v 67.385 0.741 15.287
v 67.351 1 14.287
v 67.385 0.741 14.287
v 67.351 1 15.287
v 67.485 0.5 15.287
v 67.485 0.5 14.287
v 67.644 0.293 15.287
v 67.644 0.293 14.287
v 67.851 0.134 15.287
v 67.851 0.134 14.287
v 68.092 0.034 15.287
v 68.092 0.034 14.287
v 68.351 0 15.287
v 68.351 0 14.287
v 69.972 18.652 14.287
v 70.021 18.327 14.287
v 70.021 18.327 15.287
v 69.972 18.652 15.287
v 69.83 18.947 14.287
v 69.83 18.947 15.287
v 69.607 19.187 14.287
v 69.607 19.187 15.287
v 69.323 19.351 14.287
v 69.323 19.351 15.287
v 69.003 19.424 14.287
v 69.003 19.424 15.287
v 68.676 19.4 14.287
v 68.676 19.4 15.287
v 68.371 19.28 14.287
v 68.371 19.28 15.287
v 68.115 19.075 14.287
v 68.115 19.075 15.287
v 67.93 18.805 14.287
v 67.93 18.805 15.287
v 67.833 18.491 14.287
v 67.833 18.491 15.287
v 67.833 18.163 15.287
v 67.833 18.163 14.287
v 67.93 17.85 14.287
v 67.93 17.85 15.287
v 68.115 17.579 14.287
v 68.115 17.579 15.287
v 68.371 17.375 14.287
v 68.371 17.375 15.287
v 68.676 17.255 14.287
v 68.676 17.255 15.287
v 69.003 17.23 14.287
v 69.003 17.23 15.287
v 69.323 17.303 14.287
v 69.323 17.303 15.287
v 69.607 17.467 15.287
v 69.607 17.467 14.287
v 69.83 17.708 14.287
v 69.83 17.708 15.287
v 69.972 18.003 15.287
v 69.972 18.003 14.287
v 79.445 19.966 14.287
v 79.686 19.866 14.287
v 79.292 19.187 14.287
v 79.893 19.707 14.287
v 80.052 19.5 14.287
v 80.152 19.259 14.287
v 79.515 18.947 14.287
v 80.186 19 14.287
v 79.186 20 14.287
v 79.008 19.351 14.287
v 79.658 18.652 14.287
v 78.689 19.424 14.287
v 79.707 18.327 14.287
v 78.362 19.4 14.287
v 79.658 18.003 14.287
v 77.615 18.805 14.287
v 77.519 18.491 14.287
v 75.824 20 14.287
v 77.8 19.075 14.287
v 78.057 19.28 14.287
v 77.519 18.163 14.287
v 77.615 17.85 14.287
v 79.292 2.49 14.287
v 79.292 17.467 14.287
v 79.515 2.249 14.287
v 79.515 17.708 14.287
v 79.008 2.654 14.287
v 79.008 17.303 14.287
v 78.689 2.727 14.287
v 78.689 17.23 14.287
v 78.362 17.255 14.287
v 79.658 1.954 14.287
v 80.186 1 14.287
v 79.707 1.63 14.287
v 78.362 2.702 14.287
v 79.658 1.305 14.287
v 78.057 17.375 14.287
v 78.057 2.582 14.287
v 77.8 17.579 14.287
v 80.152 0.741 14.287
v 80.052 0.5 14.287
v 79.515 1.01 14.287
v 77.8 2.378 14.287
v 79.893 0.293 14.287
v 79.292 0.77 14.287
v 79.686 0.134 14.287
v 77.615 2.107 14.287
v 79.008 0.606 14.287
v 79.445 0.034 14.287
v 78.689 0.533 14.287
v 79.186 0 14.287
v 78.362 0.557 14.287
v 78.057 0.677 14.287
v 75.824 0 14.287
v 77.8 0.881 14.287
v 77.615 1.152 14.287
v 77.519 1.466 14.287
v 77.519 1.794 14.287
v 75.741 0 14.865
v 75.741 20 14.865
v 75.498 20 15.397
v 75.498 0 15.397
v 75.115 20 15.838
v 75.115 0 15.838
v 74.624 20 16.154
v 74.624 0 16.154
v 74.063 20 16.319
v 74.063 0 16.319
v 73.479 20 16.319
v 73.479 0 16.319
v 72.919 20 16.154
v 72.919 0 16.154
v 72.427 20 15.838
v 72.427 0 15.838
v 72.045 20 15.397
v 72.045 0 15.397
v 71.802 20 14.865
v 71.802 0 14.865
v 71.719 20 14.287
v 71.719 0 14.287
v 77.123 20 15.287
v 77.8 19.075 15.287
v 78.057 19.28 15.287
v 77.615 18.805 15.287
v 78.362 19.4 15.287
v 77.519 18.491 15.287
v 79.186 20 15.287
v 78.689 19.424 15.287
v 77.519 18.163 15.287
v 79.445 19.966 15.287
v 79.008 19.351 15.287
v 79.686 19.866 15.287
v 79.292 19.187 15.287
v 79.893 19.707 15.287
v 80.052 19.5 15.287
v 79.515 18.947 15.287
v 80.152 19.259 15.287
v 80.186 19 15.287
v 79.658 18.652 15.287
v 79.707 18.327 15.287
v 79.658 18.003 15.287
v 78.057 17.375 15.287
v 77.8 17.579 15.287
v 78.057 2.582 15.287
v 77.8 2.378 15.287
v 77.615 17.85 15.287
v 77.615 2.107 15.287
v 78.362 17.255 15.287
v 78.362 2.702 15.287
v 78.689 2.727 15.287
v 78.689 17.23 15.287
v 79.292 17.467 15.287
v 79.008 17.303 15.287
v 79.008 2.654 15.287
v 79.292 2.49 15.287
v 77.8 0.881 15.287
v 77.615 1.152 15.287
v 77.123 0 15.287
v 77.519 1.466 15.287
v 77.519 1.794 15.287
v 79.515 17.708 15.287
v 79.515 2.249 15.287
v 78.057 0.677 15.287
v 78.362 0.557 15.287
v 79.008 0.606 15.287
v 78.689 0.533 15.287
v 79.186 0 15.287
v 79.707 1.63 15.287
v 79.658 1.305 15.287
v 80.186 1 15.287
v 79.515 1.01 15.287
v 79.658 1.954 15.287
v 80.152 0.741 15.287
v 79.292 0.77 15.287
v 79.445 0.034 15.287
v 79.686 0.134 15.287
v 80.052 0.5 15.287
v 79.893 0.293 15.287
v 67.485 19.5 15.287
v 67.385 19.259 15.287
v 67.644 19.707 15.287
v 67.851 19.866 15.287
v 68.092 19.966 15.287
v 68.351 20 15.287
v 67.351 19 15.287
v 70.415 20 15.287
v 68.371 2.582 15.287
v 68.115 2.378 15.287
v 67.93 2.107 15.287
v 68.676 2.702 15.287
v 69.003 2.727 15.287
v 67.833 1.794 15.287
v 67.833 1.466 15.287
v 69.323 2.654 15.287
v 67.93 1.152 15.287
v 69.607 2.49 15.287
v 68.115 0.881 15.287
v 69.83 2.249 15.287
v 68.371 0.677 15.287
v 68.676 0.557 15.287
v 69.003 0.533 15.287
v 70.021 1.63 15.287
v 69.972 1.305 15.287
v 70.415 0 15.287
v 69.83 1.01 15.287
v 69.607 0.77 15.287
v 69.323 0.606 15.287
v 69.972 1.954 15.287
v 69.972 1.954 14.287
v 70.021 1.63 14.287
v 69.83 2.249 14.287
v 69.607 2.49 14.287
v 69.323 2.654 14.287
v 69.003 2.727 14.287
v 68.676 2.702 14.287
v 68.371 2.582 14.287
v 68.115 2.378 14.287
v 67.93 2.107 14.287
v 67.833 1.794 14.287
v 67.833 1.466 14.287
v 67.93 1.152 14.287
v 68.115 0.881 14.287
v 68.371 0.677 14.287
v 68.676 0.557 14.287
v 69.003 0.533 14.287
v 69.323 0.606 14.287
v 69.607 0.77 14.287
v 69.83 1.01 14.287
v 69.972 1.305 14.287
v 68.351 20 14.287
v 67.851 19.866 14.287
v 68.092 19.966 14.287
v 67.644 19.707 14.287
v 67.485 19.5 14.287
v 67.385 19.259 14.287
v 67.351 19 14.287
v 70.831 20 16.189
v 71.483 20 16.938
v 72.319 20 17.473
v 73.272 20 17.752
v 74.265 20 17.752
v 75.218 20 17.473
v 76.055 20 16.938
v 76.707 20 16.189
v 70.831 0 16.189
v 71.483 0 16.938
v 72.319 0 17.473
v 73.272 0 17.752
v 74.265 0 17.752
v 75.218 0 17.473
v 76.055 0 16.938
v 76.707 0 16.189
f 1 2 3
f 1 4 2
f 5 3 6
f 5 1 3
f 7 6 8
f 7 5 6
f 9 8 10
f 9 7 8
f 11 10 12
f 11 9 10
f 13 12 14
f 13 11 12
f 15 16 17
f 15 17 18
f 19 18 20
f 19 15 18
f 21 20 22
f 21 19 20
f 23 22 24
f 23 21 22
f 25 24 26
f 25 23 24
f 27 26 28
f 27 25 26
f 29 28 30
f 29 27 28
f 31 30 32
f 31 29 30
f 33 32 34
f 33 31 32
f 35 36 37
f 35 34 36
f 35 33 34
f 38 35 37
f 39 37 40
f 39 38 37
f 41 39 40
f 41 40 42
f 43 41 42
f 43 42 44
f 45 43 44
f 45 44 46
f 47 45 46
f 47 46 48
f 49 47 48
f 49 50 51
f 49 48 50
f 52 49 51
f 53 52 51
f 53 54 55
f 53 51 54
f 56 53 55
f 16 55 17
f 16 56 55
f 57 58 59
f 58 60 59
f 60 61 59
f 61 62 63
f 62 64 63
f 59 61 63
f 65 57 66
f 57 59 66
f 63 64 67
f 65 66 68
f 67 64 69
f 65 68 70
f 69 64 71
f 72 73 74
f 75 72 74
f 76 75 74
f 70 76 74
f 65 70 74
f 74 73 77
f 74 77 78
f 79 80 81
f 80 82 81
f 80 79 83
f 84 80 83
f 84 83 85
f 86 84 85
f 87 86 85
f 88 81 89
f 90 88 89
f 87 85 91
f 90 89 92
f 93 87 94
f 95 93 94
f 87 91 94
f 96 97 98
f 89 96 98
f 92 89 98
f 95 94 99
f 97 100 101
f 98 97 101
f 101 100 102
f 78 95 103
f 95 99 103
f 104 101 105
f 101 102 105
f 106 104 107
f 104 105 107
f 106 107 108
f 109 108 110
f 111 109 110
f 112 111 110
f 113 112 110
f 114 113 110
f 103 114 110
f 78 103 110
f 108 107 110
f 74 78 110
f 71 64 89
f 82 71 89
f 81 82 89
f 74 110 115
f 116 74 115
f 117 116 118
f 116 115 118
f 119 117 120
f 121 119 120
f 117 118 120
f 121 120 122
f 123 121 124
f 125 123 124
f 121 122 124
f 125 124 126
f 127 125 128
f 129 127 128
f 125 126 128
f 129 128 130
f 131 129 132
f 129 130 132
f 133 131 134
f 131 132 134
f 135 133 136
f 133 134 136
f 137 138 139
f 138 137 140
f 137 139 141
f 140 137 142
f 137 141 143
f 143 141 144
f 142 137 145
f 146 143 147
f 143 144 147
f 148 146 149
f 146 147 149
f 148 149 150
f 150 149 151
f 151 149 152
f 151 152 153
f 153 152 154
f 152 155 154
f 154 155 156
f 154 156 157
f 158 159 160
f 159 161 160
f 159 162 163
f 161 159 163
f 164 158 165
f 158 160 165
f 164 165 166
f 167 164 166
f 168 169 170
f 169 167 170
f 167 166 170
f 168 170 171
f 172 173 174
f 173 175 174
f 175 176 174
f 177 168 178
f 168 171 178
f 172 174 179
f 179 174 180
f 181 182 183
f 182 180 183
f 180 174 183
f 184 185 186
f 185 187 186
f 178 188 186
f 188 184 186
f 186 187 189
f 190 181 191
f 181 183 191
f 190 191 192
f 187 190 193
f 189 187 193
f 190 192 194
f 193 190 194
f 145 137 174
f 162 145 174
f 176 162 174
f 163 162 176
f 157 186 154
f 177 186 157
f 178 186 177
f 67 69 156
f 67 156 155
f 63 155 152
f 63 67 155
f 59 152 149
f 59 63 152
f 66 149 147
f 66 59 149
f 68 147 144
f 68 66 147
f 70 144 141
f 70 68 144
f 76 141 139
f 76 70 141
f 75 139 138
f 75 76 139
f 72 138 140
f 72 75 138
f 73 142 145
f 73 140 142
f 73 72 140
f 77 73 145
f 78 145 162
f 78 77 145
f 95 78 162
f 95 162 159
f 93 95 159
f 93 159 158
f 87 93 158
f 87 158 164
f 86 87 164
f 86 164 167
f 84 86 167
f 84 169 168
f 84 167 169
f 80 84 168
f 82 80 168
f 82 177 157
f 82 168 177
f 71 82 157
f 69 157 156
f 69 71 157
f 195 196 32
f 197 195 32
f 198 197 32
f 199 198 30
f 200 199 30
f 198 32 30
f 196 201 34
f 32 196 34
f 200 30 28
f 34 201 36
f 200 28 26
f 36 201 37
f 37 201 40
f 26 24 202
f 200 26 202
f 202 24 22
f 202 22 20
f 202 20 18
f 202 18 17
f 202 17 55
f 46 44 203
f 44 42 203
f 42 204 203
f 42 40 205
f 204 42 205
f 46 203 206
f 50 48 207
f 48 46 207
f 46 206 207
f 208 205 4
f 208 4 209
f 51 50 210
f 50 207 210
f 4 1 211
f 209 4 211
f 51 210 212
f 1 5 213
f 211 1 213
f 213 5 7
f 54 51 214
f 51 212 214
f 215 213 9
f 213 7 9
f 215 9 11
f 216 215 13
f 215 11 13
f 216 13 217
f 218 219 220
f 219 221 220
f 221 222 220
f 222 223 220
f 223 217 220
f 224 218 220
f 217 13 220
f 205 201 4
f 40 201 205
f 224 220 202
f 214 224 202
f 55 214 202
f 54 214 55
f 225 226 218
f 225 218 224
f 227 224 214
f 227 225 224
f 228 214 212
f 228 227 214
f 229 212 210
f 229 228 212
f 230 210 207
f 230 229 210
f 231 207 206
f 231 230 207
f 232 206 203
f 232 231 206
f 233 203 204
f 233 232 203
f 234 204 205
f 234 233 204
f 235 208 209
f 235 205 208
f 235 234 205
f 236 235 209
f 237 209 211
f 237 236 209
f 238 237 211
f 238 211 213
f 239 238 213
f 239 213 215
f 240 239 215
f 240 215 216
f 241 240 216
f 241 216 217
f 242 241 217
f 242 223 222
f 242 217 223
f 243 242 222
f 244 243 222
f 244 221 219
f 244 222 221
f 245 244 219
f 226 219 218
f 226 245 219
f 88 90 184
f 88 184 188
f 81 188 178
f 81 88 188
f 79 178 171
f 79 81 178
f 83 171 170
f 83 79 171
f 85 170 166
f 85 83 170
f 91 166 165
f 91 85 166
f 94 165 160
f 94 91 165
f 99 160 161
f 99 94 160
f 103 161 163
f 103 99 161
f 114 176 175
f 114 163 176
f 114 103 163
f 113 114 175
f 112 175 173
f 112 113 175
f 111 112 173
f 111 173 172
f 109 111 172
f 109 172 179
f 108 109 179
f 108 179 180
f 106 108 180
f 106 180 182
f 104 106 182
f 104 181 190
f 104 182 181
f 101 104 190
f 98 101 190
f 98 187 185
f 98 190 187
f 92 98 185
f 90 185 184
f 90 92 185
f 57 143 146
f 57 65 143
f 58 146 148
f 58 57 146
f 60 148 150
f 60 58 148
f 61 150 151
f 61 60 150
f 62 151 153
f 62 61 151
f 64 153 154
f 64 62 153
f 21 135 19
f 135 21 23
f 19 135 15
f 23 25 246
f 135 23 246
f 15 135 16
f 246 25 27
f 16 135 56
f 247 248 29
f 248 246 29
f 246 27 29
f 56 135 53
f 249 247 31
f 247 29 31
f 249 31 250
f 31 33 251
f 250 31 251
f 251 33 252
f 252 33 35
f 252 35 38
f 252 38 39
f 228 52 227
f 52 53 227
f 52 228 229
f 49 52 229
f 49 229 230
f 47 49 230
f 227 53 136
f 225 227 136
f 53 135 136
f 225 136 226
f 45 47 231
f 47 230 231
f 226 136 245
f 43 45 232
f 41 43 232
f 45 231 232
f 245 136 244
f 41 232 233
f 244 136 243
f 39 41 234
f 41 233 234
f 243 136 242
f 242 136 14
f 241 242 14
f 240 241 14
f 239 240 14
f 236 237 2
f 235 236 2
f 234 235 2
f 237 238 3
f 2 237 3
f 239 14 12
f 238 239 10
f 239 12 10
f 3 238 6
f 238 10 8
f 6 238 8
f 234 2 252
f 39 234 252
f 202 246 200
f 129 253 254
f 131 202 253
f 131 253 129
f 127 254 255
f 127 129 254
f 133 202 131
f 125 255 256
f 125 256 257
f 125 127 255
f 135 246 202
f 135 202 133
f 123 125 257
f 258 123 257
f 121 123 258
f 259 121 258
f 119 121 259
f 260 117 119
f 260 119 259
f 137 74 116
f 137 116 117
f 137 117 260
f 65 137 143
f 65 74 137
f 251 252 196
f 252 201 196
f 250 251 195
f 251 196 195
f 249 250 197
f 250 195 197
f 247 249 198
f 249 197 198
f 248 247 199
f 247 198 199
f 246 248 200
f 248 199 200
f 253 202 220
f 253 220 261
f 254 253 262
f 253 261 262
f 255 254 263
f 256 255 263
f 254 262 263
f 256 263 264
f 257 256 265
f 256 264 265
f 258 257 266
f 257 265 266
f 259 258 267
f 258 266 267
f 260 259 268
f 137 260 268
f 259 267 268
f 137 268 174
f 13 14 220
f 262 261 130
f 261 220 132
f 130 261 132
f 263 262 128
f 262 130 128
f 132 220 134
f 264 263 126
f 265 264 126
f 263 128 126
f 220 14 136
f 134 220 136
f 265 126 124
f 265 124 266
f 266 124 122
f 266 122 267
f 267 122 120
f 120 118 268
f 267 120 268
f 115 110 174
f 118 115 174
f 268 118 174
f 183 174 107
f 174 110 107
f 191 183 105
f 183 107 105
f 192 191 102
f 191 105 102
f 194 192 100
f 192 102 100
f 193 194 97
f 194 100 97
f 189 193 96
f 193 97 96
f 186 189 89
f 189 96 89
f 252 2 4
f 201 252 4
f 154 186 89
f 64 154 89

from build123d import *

# Parameters (mm, degrees)
EXTRUDE_1_DEPTH          = 20
CUT_EXTRUDE_1_DEPTH      = 83.680748207
CUT_EXTRUDE_1_DEPTH_BACK = 83.680748207
SKETCH_2_R               = 1.1
FILLET_1_R               = 1


with BuildPart() as part:
    # 草图1 → 凸台-拉伸1 (new body)
    with BuildSketch(Plane(origin=(0, 0, 0), x_dir=(1, 0, 0), z_dir=(0, 1, 0))):
        with BuildLine():
            Line((67.351218567, -14.287180049), (67.351218567, -15.287180049))
            Line((67.351218567, -15.287180049), (70.414699146, -15.287180049))
            ThreePointArc((70.414699146, -15.287180049), (73.768801112, -17.787180049), (77.122903079, -15.287180049))
            Line((77.122903079, -15.287180049), (80.186383657, -15.287180049))
            Line((80.186383657, -15.287180049), (80.186383657, -14.287180049))
            Line((80.186383657, -14.287180049), (75.823885018, -14.287180049))
            ThreePointArc((75.823885018, -14.287180049), (73.771343065, -16.339722002), (71.718801112, -14.287180049))
            Line((71.718801112, -14.287180049), (67.351218567, -14.287180049))
        make_face()
    extrude(amount=EXTRUDE_1_DEPTH)

    # 草图2 → 切除-拉伸1 (cut, two sides: drawn at the far end of the back side and taken through both)
    with BuildSketch(Plane.XY.offset(15.287180049).offset(-CUT_EXTRUDE_1_DEPTH_BACK)):
        with Locations((68.921019173, 18.327295742)):
            Circle(SKETCH_2_R)
        with Locations((68.921019173, 1.629689565)):
            Circle(SKETCH_2_R)
        with Locations((78.60655426, 18.327295742)):
            Circle(SKETCH_2_R)
        with Locations((78.60655426, 1.629689565)):
            Circle(SKETCH_2_R)
    extrude(amount=CUT_EXTRUDE_1_DEPTH + CUT_EXTRUDE_1_DEPTH_BACK, mode=Mode.SUBTRACT)

    # 圆角1
    fillet_1_edges = [part.edges().sort_by_distance(p)[0] for p in [
        (80.186383657, 20, 14.787180049),
        (67.351218567, 20, 14.787180049),
        (67.351218567, 0, 14.787180049),
        (80.186383657, 0, 14.787180049),
    ]]
    fillet(fillet_1_edges, radius=FILLET_1_R)


solid = part.part
